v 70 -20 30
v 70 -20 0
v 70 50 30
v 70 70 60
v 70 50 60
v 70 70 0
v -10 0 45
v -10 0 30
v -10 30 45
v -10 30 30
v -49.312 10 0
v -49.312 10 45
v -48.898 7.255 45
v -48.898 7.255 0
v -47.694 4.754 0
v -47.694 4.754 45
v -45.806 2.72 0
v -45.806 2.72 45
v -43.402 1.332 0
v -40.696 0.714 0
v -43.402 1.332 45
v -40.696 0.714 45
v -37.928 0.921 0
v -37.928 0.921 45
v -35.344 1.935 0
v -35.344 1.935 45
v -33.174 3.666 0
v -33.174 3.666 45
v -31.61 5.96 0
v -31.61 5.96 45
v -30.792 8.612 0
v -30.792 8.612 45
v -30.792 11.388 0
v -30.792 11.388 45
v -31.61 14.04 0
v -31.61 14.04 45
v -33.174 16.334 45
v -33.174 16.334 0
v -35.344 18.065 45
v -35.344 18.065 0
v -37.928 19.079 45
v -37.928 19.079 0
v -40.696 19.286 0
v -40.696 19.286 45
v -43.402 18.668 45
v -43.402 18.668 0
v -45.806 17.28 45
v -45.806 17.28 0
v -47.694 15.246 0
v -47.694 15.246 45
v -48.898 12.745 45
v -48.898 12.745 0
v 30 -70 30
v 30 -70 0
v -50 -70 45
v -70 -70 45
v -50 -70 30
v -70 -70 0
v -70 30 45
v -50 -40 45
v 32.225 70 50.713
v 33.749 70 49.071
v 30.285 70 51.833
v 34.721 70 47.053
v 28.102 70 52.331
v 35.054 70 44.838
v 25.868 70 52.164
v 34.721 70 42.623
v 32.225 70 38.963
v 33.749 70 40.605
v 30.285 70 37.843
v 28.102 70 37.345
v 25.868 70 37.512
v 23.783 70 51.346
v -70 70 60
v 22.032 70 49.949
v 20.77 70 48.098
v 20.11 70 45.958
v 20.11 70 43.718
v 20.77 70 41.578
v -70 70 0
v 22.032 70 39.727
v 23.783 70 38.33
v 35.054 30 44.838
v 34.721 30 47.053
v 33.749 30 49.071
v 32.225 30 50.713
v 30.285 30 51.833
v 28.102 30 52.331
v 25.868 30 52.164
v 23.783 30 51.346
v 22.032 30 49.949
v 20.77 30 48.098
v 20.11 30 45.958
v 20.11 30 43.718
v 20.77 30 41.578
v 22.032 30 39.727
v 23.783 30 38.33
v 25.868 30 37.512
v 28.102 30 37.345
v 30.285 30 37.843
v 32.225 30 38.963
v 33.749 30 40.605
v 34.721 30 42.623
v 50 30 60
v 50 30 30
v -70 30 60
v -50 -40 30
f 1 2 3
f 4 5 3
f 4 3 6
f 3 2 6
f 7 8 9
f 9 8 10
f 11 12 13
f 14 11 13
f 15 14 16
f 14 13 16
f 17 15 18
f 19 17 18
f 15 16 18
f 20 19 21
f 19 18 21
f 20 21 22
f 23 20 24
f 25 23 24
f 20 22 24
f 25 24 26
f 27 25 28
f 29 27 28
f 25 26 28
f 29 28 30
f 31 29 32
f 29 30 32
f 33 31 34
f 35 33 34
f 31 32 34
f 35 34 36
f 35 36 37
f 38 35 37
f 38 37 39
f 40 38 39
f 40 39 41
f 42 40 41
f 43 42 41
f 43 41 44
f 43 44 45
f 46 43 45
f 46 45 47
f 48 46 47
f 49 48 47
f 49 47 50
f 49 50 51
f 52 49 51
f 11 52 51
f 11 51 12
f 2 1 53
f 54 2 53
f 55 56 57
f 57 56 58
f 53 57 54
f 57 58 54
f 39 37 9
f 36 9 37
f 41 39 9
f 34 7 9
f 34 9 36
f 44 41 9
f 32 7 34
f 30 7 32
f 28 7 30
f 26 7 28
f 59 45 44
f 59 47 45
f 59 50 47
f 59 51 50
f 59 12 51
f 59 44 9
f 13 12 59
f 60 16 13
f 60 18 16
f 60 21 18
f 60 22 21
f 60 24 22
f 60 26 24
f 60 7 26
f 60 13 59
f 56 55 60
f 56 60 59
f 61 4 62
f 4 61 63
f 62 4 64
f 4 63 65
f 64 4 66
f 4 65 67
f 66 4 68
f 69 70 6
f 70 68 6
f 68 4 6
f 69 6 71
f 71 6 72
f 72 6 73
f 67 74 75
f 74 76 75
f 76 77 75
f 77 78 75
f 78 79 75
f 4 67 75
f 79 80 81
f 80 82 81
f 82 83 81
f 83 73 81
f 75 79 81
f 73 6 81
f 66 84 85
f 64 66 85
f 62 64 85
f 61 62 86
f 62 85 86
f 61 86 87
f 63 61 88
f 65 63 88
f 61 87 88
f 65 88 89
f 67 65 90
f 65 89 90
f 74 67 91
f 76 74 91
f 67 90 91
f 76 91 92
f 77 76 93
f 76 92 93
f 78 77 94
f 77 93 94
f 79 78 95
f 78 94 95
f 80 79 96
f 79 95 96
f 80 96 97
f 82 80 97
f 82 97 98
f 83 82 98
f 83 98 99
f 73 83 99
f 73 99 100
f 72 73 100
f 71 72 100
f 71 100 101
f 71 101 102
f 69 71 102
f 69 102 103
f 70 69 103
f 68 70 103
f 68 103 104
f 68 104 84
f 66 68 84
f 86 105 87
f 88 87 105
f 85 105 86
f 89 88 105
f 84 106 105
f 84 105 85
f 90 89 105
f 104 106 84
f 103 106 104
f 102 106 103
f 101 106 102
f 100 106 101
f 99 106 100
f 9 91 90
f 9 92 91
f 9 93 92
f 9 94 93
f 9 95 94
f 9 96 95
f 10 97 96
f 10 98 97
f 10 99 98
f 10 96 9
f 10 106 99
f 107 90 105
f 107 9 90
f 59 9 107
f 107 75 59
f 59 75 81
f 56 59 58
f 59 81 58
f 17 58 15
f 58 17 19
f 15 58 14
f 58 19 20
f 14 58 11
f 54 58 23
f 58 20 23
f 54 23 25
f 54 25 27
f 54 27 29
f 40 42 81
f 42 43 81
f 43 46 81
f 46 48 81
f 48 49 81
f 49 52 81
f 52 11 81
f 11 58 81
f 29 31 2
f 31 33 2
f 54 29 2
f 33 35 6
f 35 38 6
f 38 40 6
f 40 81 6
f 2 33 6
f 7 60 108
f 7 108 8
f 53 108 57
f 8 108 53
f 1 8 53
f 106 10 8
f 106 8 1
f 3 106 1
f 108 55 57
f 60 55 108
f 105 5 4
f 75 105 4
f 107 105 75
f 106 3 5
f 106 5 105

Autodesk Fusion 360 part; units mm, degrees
sketch "Sketch1" plane through (0, 0, 0) normal (0, 0, 1) x (1, 0, 0) in component "box"
  line L0 (70, 70) -> (-70, 70)
  line L1 (-70, 70) -> (-70, -70)
  line L2 (-70, -70) -> (70, -70)
  line L3 (70, -70) -> (70, 70)
  line L4 (70, 70) -> (-70, -70) construction
  line L5 (-70, 70) -> (70, -70) construction
  dimension "d1" = 140
extrude "Extrude1" add sketch "Sketch1" along normal blind 30 in component "box"
sketch "Sketch2" plane through (0, -70, 0) normal (0, -1, 0) x (1, 0, 0) in component "box"
  line L0 (-70, 0) -> (70, 0)
  line L1 (70, 0) -> (70, 30)
  line L2 (70, 30) -> (-70, 30)
  line L3 (-70, 30) -> (-70, 0)
sketch "Sketch3" plane through (0, 0, 30) normal (0, 0, 1) x (-1, 0, 0) in component "box"
  line L0 (-70, 70) -> (-70, -70)
  line L1 (-70, -70) -> (70, -70)
  line L2 (70, -70) -> (70, 70)
  line L3 (70, 70) -> (-70, 70)
  line L4 (-70, 20) -> (-30, 70)
  line L5 (-30, 70) -> (-70, 70)
  line L6 (-70, 20) -> (-70, 70)
extrude "Extrude2" cut sketch "Sketch3" against normal up to surface (30 mm away) contours L0 L3 L4 L5 L6 in component "box"
sketch "Sketch4" plane through (0, 0, 30) normal (0, 0, 1) x (-1, 0, 0) in component "box"
  line L0 (-30, 70) -> (-70, 20)
  line L1 (-70, 20) -> (-70, -70)
  line L2 (-70, -70) -> (70, -70)
  line L3 (70, -70) -> (70, 70)
  line L4 (70, 70) -> (-30, 70)
  line L5 (-70, -30) -> (70, -30)
  line L6 (70, -30) -> (70, -70)
  line L7 (70, -70) -> (-70, -70)
  line L8 (-70, -70) -> (-70, -30)
  line L9 (-70, -30) -> (70, -70) construction
  line L10 (70, -30) -> (-70, -70) construction
  point P0 (0, -50)
extrude "Extrude3" add sketch "Sketch4" along normal blind 30 contours L1 L2 L3 L5 L6 L7 L8 in component "box"
sketch "Sketch5" plane through (0, 0, 30) normal (0, 0, 1) x (-1, 0, 0) in component "box"
  line L0 (-70, -30) -> (70, -30)
  line L1 (70, -30) -> (70, 70)
  line L2 (70, 70) -> (-30, 70)
  line L3 (-30, 70) -> (-70, 20)
  line L4 (-70, 20) -> (-70, -30)
  line L5 (10, -30) -> (70, -30)
  line L6 (70, -30) -> (70, 70)
  line L7 (70, 70) -> (10, 70)
  line L8 (10, 70) -> (10, -30)
  line L9 (10, -30) -> (70, 70) construction
  line L10 (70, -30) -> (10, 70) construction
  point P0 (40, 20)
extrude "Extrude4" add sketch "Sketch5" along normal blind 15 contours L0 L1 L2 L5 L6 L7 L8 in component "box"
sketch "Sketch6" plane through (0, 0, 45) normal (0, 0, 1) x (-1, 0, 0) in component "box"
  line L0 (10, 70) -> (10, -30)
  line L1 (10, -30) -> (70, -30)
  line L2 (70, -30) -> (70, 70)
  line L3 (70, 70) -> (10, 70)
  line L4 (50, 70) -> (50, 40)
  line L5 (50, 40) -> (10, 0)
  line L6 (10, 70) -> (50, 70)
extrude "Extrude5" cut sketch "Sketch6" against normal blind 15 contours L0 L3 L4 L5 L6 in component "box"
sketch "Sketch7" plane through (0, 0, 60) normal (0, 0, 1) x (-1, 0, 0) in component "box"
  line L0 (-70, -70) -> (70, -70)
  line L1 (70, -70) -> (70, -30)
  line L2 (70, -30) -> (-70, -30)
  line L3 (-70, -30) -> (-70, -70)
  line L4 (-70, -50) -> (-50, -30)
  line L5 (-70, -30) -> (-70, -50)
extrude "Extrude6" cut sketch "Sketch7" against normal blind 30 contours L2 L3 L4 L5 in component "box"
sketch "Sketch8" plane through (0, 0, 45) normal (0, 0, 1) x (-1, 0, 0) in component "box"
  line L0 (50, 40) -> (10, 0)
  line L1 (10, 0) -> (10, -30)
  line L2 (10, -30) -> (70, -30)
  line L3 (70, -30) -> (70, 70)
  line L4 (70, 70) -> (50, 70)
  line L5 (50, 70) -> (50, 40)
  circle A0 centre (40, -10) radius 9.3121
extrude "Extrude7" cut sketch "Sketch8" against normal blind 45 contours A0 in component "box"
sketch "Sketch9" plane through (0, 30, 0) normal (0, -1, 0) x (1, 0, 0) in component "box"
  line L0 (50, 30) -> (50, 60)
  line L1 (50, 60) -> (-70, 60)
  line L2 (-70, 60) -> (-70, 45)
  line L3 (-70, 45) -> (-10, 45)
  line L4 (-10, 45) -> (-10, 30)
  line L5 (-10, 30) -> (50, 30)
  circle A0 centre (27.54, 44.8379) radius 7.5144
extrude "Extrude8" cut sketch "Sketch9" against normal blind 40 contours A0 in component "box"
component "box" placed x (1, 0, 0) y (0, 1, 0) z (0, 0, 1) at (0, 0, 0)
